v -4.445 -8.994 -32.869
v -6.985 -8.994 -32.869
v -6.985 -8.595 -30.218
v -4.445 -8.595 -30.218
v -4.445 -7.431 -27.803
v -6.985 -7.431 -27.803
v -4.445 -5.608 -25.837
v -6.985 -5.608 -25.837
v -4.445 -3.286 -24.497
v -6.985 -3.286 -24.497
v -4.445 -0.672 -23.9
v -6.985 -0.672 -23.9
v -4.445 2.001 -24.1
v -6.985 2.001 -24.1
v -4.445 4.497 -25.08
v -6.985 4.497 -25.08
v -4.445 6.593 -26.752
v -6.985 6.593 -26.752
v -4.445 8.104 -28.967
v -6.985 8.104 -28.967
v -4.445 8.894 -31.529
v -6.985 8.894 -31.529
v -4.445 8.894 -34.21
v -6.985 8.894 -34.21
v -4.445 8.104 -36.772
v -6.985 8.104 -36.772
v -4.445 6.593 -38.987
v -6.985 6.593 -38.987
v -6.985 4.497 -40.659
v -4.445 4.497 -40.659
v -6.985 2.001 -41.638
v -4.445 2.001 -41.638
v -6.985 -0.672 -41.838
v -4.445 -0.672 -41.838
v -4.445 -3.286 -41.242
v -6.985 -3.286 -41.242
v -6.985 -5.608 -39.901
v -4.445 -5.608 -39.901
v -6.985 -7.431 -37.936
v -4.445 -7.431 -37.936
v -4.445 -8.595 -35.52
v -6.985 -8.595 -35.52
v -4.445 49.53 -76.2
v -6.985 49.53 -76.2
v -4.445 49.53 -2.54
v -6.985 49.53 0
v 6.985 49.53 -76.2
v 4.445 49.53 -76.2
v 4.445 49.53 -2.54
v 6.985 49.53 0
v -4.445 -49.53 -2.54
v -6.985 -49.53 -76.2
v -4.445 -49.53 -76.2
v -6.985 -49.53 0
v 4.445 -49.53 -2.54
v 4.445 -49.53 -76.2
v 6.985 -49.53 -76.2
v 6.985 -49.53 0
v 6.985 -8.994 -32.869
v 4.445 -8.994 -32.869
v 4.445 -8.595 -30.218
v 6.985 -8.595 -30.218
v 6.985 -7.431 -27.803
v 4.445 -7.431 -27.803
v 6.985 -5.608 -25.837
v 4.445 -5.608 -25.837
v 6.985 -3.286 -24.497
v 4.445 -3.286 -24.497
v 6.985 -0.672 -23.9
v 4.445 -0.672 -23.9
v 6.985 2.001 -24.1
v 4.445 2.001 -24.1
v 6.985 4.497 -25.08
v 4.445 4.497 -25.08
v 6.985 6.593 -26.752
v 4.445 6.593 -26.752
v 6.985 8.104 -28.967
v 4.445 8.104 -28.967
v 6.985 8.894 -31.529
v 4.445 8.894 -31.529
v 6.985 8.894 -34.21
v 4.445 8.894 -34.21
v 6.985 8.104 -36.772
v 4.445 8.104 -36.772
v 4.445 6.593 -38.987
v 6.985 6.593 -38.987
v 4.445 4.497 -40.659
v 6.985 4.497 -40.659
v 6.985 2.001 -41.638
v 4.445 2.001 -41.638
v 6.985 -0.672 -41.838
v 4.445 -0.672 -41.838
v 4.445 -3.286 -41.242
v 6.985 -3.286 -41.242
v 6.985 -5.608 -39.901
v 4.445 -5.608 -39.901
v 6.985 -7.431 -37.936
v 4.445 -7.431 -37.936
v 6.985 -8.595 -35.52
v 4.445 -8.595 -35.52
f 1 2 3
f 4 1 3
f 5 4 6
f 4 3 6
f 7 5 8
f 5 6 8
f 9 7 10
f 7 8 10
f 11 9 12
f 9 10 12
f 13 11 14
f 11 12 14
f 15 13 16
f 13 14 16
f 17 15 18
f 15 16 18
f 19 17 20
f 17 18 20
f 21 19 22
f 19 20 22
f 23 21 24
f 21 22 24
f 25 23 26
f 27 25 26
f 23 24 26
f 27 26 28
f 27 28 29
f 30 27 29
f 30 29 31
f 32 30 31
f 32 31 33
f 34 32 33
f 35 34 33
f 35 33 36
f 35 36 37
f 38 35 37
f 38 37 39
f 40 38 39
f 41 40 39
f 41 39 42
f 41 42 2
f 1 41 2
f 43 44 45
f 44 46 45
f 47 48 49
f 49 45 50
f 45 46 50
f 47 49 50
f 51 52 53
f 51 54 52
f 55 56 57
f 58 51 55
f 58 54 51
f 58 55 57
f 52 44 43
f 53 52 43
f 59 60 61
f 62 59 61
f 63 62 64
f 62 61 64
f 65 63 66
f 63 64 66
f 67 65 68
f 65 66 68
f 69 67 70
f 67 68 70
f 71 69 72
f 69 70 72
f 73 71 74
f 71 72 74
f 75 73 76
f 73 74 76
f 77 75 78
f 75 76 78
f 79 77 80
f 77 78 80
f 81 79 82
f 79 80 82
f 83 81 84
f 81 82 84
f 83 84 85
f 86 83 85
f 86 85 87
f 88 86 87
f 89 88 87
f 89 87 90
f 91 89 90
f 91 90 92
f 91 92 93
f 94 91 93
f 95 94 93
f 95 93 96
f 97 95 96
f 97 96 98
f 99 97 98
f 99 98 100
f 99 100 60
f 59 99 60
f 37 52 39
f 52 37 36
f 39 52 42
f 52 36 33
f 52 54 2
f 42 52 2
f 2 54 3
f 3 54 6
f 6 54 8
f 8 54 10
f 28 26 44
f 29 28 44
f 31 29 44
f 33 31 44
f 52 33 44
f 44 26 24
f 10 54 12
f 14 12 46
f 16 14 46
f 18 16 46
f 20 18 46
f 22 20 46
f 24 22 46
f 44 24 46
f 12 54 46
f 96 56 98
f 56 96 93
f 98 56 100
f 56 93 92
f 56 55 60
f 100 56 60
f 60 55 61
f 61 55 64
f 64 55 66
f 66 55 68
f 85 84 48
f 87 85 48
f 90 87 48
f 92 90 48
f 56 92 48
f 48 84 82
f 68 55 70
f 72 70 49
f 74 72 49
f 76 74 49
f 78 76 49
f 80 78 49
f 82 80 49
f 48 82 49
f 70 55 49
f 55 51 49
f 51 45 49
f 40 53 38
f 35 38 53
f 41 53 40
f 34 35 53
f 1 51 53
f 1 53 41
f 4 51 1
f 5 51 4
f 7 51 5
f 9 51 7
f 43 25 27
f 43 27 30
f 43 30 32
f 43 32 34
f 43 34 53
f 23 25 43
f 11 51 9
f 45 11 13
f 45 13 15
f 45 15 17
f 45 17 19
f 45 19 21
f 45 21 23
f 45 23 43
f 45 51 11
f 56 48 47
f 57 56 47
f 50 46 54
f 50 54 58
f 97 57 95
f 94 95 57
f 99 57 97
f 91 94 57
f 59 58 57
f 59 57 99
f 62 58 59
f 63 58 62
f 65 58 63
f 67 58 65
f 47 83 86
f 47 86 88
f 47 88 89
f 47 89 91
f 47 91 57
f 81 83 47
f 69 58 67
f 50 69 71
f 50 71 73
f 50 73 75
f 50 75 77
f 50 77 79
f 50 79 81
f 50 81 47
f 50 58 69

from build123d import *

# Parameters (mm, degrees)
F0_W     = 13.97
F0_H     = 99.06
F1_DEPTH = 76.2
F2_T     = -2.54
F3_R     = 8.994347
F4_DEPTH = 118.618


with BuildPart() as f1:
    # F0 (on Top) → F1 (new body)
    with BuildSketch(Plane.XY):
        Rectangle(F0_W, F0_H)
    extrude(amount=-F1_DEPTH)

    # F2
    f2_openings = [f1.faces().sort_by_distance(p)[0] for p in [
        (0, 0, -76.2),
        (0, 49.53, -38.1),
        (0, -49.53, -38.1),
    ]]
    offset(amount=F2_T, openings=f2_openings)

    # F3 (on face) → F4 (cut)
    with BuildSketch(Plane(origin=(-6.985, 0, 0), x_dir=(0, -1, 0), z_dir=(-1, 0, 0))):
        with Locations((0, -32.869287)):
            Circle(F3_R)
    extrude(amount=-F4_DEPTH, mode=Mode.SUBTRACT)


solid = f1.part
